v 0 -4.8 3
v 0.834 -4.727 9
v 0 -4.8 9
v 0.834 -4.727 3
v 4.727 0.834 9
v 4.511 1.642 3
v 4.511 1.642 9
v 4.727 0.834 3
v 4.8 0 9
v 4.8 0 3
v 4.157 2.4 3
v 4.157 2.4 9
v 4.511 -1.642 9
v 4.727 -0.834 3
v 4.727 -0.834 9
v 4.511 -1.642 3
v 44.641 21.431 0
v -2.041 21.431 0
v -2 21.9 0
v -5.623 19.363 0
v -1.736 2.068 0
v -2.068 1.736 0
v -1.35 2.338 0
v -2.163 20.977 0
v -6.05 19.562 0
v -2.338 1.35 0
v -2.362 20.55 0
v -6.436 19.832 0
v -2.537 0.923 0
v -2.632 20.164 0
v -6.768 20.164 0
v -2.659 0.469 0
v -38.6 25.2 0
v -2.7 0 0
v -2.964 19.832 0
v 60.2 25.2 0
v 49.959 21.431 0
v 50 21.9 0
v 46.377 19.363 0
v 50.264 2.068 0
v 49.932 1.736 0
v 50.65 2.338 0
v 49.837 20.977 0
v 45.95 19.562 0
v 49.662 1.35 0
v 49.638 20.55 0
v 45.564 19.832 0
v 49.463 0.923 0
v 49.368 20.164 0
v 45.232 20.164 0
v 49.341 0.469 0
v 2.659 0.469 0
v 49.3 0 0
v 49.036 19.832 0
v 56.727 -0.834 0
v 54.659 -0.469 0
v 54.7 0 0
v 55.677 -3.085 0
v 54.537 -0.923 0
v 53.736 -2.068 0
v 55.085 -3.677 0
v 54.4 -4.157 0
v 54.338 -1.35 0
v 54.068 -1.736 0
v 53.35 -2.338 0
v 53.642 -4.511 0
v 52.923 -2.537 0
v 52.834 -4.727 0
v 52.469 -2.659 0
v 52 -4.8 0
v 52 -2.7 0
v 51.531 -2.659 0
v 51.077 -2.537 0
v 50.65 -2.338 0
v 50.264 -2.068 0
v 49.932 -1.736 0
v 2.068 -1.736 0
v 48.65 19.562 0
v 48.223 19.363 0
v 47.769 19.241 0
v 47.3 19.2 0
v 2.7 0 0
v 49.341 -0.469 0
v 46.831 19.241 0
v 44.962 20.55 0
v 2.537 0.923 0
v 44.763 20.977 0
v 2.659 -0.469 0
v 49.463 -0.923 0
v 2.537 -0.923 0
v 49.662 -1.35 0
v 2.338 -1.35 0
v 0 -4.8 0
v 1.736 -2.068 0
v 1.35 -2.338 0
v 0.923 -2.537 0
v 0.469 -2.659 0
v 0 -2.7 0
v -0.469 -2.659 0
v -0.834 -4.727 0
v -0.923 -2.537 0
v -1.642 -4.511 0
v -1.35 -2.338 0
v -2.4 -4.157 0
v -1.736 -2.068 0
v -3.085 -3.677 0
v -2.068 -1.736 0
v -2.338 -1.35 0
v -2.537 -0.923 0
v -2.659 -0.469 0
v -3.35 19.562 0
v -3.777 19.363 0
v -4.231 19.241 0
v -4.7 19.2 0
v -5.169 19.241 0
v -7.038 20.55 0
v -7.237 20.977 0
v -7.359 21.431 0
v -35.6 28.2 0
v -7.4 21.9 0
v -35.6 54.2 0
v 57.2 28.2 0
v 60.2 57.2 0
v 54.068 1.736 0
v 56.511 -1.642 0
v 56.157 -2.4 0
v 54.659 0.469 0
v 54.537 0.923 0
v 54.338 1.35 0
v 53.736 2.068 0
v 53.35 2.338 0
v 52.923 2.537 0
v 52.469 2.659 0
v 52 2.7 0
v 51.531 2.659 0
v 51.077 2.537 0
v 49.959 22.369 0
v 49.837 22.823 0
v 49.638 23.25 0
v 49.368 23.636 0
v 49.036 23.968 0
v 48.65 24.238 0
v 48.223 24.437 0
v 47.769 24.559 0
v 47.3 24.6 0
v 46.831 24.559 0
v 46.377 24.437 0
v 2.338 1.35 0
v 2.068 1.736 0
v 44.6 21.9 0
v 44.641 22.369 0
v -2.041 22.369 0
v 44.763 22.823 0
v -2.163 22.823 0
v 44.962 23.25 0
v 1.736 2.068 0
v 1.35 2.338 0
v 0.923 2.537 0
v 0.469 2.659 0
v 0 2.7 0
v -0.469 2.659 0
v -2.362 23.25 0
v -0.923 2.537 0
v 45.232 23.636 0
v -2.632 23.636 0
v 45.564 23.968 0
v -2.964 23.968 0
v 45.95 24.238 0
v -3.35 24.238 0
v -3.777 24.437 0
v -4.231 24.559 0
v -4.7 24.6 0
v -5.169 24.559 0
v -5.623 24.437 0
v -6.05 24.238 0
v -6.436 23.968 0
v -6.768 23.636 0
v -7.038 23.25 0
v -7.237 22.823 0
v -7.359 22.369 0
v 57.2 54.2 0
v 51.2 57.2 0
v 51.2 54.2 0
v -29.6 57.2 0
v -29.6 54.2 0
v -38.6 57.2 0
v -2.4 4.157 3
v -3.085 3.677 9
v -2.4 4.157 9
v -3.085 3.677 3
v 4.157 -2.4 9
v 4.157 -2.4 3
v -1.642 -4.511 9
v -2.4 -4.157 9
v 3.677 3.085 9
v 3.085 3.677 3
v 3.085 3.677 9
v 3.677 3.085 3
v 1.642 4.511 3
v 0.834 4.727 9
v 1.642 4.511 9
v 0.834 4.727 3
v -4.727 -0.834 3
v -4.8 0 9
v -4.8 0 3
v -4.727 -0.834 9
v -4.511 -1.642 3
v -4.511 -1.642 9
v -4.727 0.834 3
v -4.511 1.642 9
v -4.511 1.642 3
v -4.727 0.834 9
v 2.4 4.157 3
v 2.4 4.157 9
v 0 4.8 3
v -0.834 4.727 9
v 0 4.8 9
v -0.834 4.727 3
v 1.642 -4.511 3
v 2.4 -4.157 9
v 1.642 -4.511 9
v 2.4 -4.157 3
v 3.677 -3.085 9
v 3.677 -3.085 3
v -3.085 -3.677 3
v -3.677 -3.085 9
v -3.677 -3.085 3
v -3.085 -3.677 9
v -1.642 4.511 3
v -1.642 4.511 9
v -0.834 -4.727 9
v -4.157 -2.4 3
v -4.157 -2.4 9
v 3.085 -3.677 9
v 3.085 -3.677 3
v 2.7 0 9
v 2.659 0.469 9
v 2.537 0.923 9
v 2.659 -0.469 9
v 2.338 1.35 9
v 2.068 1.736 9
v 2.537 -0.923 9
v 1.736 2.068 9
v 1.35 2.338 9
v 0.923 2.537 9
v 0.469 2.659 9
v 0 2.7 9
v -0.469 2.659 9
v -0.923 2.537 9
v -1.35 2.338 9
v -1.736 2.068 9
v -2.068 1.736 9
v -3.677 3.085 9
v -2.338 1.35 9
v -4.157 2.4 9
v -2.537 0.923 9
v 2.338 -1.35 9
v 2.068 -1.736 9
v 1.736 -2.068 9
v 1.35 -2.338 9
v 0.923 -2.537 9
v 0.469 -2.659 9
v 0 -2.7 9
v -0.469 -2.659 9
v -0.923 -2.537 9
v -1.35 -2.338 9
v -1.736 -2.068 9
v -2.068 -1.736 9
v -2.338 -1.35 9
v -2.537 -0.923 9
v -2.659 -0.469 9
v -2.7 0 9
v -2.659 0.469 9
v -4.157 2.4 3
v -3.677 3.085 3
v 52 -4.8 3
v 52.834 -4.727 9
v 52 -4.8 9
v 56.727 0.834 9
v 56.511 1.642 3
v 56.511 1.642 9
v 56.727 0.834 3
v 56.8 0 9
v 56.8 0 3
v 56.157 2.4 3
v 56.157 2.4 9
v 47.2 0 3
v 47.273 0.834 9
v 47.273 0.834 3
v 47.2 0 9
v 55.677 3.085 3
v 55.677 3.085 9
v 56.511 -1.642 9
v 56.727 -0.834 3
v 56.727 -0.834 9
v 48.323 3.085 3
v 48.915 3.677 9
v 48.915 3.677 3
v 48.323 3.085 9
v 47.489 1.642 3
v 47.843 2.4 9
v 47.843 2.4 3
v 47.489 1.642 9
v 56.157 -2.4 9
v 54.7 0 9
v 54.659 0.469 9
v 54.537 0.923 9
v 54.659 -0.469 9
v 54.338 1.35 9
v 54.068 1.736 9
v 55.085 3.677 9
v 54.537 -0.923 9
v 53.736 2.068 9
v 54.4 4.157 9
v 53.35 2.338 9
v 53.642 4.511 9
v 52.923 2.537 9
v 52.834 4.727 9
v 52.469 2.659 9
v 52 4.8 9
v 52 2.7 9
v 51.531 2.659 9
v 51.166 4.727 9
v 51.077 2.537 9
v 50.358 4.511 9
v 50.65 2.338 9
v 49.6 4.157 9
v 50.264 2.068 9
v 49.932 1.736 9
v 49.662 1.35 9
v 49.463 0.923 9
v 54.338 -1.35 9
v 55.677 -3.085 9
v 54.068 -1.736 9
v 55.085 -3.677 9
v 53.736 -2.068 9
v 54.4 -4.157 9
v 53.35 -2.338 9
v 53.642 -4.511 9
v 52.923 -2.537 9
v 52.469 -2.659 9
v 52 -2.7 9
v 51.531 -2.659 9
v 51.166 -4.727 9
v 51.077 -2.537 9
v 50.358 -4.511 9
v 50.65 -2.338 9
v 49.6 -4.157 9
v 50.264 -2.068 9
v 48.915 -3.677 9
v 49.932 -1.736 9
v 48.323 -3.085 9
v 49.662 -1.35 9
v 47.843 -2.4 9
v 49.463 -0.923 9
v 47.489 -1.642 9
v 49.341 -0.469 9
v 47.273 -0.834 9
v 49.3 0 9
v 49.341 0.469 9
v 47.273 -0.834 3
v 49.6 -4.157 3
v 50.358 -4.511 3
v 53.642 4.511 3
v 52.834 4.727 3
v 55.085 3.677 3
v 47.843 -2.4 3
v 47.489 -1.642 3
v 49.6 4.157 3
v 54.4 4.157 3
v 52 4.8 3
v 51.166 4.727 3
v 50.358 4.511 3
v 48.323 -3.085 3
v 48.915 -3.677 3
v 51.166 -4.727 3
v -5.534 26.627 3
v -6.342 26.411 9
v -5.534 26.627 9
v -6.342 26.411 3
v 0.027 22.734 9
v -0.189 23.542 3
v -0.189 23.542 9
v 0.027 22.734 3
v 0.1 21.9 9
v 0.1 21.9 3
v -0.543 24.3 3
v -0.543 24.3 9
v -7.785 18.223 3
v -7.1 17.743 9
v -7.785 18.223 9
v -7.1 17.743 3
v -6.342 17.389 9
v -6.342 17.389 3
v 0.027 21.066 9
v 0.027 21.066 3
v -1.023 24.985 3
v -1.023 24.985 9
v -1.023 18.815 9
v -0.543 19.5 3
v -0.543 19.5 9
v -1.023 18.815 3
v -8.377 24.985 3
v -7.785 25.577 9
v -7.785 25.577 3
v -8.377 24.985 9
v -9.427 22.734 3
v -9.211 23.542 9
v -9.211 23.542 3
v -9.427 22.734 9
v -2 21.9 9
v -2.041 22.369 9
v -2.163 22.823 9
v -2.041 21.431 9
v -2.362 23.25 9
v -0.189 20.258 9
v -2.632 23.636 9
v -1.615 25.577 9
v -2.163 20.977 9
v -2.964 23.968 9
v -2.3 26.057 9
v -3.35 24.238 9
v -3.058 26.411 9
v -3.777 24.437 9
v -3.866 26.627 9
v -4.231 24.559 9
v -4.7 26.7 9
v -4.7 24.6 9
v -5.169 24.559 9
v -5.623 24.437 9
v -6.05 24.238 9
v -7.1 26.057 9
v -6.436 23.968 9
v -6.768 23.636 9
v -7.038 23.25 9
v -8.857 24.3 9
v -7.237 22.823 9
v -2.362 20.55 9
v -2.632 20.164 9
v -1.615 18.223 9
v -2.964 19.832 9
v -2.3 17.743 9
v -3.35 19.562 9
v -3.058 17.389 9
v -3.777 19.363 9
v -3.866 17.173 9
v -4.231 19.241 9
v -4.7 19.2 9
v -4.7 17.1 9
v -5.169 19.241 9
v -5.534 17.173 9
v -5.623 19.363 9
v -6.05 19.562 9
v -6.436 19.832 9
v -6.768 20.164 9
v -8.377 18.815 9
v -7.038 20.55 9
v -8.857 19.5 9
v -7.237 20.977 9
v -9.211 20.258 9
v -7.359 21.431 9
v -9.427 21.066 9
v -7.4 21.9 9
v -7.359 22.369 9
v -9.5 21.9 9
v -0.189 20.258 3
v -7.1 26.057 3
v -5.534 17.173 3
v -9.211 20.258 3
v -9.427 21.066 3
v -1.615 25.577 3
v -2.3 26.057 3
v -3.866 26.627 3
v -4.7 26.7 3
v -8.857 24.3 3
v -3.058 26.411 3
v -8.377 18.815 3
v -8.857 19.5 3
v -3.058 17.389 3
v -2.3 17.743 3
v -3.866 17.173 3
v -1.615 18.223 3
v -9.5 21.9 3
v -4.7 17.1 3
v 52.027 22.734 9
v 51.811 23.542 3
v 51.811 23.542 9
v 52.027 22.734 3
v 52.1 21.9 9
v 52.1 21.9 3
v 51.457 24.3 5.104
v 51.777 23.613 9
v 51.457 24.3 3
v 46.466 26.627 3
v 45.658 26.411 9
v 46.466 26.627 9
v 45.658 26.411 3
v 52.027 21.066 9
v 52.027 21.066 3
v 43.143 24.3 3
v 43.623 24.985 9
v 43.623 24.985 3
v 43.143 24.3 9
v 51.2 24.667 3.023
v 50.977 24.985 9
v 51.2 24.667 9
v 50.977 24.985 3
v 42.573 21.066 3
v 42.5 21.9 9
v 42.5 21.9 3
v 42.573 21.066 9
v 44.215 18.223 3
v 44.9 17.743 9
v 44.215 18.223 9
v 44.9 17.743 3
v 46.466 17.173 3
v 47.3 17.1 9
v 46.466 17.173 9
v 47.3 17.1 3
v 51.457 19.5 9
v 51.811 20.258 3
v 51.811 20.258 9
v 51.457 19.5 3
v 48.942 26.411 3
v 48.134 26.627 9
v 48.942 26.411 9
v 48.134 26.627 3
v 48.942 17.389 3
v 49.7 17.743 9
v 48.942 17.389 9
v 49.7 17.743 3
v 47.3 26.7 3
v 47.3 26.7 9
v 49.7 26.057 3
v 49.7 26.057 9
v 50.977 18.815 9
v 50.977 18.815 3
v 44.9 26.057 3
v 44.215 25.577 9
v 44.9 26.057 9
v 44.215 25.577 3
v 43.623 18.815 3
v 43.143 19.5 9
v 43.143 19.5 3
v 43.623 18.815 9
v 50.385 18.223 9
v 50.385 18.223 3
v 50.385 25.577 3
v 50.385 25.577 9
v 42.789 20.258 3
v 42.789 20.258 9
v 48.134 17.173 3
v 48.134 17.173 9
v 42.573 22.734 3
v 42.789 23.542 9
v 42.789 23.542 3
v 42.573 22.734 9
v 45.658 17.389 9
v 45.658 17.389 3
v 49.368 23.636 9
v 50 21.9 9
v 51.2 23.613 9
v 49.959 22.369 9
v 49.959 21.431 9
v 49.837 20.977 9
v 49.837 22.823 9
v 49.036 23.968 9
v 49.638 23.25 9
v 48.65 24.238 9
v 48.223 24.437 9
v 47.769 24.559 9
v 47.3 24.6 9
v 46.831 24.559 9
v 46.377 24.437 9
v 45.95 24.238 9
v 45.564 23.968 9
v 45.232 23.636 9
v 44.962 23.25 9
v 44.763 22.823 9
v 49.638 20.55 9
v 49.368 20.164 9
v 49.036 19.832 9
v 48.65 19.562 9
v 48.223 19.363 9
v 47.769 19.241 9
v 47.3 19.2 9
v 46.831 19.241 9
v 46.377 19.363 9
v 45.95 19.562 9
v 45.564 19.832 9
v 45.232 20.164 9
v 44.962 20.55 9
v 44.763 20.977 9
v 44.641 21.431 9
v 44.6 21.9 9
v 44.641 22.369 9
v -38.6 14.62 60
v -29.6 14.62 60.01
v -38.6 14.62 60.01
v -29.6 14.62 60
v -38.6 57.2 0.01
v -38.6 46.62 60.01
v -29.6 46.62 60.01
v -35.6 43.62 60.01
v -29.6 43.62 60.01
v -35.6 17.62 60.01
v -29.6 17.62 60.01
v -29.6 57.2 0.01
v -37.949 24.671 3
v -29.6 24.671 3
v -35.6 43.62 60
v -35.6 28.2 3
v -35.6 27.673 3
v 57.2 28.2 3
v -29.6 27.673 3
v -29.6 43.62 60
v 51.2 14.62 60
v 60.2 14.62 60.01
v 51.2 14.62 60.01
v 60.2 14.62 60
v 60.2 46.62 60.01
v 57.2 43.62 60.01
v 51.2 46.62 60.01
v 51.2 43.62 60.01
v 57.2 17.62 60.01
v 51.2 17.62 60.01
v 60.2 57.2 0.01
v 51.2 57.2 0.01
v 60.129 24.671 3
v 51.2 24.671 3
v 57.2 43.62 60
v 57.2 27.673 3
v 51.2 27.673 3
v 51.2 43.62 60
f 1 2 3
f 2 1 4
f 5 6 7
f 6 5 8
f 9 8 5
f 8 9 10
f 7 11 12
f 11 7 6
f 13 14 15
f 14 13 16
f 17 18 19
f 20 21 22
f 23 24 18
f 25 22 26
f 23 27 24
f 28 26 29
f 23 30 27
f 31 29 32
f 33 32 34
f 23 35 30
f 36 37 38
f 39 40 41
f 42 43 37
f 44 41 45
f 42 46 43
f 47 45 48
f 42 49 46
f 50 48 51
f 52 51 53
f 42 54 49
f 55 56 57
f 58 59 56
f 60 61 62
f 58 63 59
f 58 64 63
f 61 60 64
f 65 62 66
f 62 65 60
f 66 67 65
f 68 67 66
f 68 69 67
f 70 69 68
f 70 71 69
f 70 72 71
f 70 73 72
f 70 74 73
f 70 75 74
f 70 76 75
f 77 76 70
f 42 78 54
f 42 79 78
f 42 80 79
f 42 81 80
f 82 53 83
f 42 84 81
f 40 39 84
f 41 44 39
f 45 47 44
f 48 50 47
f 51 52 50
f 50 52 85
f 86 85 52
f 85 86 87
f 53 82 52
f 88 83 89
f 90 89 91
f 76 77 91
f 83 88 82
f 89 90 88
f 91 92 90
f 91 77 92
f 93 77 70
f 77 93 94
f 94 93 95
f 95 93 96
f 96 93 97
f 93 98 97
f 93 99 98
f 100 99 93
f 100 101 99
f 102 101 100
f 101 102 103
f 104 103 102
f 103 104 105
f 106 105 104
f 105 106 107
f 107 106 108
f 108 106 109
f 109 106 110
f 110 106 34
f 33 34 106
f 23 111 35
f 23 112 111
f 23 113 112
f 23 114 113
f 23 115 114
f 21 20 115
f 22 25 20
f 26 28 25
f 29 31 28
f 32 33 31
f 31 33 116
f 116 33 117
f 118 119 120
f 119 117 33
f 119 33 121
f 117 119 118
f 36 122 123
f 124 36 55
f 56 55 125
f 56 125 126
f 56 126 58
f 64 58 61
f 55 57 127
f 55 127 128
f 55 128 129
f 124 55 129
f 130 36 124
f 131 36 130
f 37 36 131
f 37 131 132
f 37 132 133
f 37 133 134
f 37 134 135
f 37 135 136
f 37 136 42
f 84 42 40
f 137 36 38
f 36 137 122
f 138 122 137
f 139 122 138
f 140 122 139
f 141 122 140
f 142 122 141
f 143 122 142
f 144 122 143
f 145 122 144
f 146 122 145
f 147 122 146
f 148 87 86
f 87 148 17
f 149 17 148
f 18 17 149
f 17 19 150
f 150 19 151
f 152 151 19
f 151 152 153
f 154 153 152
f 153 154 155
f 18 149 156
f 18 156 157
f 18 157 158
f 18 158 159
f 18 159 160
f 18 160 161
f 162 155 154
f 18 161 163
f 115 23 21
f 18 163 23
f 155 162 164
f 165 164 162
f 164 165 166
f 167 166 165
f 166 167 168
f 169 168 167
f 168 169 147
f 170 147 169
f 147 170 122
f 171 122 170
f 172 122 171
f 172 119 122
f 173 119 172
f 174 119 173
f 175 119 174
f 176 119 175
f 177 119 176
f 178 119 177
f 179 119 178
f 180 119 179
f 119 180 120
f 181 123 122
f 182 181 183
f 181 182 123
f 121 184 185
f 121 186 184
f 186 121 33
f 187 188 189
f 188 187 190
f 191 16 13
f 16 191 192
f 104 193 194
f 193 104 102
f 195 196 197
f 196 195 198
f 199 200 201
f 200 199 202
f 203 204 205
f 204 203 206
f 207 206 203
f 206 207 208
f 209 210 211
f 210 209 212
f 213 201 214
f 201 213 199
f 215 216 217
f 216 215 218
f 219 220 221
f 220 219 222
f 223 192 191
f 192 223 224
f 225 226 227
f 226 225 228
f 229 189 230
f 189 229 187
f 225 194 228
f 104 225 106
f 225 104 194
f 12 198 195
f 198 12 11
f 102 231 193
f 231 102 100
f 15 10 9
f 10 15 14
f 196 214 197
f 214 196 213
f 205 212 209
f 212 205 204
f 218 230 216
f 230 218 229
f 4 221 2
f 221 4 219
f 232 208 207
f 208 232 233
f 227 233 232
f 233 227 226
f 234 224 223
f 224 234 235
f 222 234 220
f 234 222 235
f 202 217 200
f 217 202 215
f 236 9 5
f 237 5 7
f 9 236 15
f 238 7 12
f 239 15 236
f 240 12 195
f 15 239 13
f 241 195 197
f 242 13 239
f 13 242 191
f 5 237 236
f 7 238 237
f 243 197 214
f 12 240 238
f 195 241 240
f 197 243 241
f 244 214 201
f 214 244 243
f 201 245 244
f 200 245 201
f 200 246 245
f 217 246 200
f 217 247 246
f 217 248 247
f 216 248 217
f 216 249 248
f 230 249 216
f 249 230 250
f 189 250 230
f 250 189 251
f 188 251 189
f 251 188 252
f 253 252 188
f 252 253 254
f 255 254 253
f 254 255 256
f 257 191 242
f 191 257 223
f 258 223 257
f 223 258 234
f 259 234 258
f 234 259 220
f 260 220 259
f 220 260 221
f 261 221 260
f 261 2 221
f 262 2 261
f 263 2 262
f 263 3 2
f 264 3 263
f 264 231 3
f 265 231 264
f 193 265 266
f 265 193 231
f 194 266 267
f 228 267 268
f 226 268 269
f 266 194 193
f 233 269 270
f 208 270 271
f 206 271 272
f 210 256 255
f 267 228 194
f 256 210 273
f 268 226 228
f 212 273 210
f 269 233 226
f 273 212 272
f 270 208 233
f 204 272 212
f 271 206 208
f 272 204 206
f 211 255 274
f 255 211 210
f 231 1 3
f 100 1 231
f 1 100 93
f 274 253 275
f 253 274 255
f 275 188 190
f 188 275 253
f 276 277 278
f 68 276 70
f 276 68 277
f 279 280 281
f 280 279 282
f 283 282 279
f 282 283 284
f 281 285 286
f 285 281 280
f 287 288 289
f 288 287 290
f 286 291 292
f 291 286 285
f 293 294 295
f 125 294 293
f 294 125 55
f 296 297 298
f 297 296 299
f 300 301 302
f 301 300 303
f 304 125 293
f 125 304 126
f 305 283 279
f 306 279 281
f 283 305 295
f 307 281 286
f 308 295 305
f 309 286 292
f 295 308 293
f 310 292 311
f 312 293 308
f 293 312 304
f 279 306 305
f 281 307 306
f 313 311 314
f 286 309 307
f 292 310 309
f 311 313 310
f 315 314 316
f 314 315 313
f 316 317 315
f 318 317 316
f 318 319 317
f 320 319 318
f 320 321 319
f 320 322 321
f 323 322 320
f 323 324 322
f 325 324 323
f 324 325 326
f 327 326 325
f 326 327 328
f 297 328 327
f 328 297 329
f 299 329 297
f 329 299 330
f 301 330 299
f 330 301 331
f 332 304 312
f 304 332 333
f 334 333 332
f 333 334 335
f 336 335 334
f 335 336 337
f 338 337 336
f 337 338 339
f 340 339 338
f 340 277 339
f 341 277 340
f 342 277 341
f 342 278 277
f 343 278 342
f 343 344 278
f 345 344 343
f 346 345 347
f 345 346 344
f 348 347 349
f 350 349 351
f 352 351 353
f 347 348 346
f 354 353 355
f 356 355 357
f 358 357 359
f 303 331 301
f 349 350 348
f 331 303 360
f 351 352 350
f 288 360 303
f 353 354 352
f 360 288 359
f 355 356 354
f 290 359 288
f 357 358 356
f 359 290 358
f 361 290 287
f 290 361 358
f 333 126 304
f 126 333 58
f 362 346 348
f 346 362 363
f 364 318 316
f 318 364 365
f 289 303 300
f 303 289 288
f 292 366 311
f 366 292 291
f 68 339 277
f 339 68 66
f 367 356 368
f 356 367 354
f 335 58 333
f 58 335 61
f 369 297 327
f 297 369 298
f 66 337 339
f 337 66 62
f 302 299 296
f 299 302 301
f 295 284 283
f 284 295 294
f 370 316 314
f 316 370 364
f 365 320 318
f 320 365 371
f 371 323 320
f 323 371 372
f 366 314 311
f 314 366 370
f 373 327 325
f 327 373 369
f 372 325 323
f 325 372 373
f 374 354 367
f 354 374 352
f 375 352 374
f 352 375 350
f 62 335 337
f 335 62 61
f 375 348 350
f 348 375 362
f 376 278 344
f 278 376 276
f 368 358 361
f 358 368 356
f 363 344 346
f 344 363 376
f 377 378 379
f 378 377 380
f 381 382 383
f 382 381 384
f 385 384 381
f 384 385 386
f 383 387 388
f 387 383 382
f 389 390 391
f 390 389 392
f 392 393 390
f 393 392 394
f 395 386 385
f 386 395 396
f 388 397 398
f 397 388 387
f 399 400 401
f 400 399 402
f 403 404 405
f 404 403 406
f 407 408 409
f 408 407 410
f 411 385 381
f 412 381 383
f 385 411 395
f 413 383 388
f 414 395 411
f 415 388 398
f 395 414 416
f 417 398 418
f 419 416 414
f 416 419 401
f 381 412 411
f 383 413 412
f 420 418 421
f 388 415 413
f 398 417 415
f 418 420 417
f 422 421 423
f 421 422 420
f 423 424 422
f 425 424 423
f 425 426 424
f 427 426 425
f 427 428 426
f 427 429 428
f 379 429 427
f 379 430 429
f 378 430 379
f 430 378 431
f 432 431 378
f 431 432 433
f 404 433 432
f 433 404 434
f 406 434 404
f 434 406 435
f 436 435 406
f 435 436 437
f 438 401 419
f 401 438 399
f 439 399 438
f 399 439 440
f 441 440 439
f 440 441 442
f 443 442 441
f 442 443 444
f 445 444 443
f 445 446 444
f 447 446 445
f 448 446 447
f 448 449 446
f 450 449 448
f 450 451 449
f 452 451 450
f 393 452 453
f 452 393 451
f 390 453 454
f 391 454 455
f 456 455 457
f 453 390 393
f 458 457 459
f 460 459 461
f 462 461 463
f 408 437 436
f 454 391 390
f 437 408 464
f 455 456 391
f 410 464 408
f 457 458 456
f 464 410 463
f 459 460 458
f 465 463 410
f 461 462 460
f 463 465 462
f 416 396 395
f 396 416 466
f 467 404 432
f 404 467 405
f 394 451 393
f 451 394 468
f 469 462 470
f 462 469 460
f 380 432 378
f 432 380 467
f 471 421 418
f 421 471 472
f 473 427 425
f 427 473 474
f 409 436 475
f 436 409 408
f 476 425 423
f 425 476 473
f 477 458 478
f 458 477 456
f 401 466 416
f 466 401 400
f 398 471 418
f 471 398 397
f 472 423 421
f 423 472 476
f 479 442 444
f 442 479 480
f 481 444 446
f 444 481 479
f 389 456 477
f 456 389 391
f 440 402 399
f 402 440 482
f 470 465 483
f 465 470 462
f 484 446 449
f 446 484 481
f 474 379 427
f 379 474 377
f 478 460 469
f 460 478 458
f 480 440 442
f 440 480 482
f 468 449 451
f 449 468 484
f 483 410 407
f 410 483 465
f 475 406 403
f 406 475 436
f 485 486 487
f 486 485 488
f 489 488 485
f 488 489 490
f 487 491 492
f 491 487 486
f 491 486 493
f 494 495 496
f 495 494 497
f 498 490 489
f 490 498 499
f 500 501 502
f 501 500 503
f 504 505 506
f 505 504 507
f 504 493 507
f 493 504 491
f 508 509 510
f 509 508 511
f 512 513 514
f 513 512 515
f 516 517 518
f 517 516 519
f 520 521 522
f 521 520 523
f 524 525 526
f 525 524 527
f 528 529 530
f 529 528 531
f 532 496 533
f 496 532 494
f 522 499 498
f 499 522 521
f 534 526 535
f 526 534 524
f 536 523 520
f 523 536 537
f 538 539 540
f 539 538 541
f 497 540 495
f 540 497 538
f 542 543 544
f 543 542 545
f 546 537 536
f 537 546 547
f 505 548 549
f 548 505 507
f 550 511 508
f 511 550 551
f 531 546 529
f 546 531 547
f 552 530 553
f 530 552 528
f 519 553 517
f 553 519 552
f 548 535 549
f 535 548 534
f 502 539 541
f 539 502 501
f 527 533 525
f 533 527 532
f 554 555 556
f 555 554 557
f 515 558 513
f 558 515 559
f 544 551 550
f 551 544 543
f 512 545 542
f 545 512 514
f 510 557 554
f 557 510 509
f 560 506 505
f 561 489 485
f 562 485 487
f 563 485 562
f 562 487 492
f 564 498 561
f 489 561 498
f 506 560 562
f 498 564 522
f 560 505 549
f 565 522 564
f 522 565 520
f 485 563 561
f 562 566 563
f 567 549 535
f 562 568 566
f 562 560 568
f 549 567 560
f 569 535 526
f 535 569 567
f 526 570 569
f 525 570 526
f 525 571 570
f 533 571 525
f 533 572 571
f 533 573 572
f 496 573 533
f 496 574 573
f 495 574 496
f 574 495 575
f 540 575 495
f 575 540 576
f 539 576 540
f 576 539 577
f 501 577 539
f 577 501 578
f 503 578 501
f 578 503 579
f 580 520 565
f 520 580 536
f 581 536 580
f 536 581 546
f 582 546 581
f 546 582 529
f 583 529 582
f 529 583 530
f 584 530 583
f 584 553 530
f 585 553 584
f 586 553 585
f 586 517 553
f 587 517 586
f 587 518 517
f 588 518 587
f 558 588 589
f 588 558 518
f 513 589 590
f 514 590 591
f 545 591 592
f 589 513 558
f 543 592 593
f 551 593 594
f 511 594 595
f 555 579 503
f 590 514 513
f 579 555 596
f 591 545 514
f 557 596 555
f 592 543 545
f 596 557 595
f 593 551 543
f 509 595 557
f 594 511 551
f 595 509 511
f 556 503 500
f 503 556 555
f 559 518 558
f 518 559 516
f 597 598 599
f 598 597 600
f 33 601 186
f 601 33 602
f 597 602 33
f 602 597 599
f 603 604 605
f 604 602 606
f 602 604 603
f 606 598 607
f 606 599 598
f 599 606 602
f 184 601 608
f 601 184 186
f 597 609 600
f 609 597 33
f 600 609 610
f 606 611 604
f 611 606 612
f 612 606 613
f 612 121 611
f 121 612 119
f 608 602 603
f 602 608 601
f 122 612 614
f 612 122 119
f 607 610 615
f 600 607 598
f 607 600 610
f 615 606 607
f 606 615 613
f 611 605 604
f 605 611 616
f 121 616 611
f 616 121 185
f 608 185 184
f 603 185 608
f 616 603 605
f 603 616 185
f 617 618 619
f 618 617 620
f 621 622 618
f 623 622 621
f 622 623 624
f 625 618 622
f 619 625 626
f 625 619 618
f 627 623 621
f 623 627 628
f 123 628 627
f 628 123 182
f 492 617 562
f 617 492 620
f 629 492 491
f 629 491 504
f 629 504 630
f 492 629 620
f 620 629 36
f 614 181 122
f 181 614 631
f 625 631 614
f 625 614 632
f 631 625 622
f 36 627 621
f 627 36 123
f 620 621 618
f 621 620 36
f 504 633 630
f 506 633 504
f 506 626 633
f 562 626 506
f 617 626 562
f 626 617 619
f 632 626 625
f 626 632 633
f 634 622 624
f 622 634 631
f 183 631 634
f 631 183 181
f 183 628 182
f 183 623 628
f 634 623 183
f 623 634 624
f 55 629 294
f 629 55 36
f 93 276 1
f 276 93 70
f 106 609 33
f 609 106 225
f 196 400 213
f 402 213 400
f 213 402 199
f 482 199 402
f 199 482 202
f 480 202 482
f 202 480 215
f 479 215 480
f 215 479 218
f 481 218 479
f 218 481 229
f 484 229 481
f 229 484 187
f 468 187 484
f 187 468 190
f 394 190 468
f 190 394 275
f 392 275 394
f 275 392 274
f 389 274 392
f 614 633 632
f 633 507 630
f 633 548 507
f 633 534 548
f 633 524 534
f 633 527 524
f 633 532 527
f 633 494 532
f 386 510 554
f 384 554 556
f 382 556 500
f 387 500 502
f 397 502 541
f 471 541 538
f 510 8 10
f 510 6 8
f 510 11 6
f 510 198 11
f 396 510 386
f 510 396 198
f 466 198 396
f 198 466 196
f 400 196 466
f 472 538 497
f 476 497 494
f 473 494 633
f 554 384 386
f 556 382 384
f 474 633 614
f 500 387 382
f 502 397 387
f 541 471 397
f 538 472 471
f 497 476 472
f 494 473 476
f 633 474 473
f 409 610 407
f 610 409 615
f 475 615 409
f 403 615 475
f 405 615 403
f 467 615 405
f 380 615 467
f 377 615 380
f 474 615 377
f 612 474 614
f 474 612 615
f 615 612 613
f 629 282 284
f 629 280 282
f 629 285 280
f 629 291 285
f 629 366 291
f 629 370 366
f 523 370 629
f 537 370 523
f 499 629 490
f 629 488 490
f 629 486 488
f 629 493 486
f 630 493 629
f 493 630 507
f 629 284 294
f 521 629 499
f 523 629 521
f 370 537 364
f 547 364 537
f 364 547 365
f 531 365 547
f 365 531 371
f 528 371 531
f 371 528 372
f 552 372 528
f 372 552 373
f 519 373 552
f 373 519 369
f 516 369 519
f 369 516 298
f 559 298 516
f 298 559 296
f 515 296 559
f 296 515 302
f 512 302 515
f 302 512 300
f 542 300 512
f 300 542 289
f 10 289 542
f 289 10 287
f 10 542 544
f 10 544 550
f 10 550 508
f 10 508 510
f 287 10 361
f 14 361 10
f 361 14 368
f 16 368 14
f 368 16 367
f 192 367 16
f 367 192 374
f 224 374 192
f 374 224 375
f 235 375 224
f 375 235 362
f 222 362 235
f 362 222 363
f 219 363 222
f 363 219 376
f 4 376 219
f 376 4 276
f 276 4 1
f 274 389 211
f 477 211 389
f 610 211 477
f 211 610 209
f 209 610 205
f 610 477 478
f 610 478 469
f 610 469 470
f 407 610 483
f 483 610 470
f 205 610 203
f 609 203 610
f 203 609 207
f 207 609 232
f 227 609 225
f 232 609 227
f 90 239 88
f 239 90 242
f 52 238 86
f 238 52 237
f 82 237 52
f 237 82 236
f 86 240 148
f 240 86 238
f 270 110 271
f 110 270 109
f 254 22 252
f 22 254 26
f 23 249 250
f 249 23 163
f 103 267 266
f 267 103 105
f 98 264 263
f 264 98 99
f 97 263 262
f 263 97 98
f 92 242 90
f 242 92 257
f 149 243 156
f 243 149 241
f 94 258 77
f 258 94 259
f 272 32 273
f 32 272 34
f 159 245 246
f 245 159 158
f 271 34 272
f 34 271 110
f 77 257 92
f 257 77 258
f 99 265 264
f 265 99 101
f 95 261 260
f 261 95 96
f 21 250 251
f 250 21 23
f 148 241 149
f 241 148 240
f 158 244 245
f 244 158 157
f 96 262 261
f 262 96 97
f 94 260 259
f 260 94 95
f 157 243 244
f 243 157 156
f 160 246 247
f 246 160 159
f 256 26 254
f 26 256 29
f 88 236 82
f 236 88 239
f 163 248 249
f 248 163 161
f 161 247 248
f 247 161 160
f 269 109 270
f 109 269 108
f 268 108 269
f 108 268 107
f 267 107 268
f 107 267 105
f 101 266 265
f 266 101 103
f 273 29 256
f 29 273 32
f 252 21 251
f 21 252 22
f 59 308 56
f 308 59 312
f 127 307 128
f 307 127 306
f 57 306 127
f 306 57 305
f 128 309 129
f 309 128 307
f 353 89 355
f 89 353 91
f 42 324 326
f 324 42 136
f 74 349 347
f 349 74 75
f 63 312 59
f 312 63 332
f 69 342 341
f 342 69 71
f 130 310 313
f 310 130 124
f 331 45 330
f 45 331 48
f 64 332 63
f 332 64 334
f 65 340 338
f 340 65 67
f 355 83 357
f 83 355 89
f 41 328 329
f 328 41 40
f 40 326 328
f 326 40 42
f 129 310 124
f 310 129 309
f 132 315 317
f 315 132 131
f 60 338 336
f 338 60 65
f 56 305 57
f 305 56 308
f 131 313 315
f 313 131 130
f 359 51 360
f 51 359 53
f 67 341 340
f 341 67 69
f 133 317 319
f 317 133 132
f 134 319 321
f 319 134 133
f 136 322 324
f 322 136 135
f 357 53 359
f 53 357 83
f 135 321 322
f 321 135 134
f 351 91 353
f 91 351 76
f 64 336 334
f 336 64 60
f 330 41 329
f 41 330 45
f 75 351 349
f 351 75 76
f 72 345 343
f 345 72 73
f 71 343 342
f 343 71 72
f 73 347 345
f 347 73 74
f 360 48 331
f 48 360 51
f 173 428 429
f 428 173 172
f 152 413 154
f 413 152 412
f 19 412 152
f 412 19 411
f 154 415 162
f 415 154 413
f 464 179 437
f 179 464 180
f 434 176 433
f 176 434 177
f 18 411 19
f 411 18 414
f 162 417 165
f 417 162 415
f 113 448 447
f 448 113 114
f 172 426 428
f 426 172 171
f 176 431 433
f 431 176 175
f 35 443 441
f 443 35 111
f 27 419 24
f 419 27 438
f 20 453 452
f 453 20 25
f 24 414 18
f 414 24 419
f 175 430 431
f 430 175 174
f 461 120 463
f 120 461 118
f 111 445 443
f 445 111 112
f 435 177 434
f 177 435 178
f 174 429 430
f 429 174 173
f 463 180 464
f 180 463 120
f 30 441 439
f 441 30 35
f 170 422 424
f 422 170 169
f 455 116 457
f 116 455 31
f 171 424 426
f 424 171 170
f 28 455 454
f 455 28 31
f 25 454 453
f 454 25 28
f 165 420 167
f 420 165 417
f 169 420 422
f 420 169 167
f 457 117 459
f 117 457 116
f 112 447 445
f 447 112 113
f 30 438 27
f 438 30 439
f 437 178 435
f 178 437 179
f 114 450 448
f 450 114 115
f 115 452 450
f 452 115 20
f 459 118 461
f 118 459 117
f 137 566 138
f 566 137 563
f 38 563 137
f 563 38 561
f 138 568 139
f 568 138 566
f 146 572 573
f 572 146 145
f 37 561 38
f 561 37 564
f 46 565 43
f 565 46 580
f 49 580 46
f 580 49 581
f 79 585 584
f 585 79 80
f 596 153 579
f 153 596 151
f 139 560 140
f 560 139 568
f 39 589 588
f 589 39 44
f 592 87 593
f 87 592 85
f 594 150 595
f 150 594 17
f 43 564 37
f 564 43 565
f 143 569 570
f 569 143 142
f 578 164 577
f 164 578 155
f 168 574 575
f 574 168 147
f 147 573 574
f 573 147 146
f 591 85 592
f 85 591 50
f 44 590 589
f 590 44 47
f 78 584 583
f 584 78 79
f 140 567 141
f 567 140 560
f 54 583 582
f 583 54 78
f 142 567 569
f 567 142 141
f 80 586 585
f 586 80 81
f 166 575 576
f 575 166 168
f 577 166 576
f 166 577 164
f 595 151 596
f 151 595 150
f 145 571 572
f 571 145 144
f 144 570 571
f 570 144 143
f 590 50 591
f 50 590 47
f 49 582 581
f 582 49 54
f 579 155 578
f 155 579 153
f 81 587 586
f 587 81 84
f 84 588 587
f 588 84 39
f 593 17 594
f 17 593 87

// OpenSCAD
// ============================================================
// 92mm Fan Holder — tilted, with left/right alignment choice
// Fan is vertical but tilted tilt_deg degrees toward the front (−Y).
// U-bracket arms are parallelogram prisms that follow the tilt.
// All faces at Z=0 are flat → printable without supports.
// Fan slides in along the tilt axis from the top.
// ============================================================

/* [Fan] */
fan_size    = 92;     // Fan outer side length (mm) — square
fan_thick   = 25;     // Fan body depth in Y (mm)
fan_clear_x = 0.4;   // Gap between outer wall and fan face in X (mm)
fan_clear_y = 0.5;   // Gap between arm and fan in Y (mm)
fan_behind  = 2;    // Gap from pin-area rear edge to front arm at Z=0 (mm)
tilt_deg    = 10;    // Tilt angle toward front — degrees from vertical
fan_align   = "right"; // "left" = fan centred on left pin pair, "right" = right pin pair

/* [Pin Mounting] */
pin_hole_r  = 2.3;  // Pin radius (mm)
pin_clear   = 0.4;  // Extra radius clearance for printing tolerance (mm)
pin_wall    = 2.5;  // Socket wall thickness (mm)
pin_sock_h  = 6;    // Socket height above base plate (mm)
base_t      = 3;    // Base bridge plate thickness (mm)

pin_dx      = 52; // X distance between pins in same row (mm)
pin_dy      = 21.9; // Y distance between rows (mm)
pin_shift_x = -4.7;  // X offset of back row vs front row (mm)

/* [U-Brackets] */
arm_t       = 3;    // Arm and outer-wall thickness (mm)
arm_d       = 6;    // Arm depth extending inward over fan edge (mm)
bracket_h   = 60;   // Total Z height of U-brackets (mm)

$fn = 36;
eps = 0.01;  // thin face for hull slabs

// ============================================================
// Derived — do not edit
// ============================================================

pin_pos = [
    [0,                    0     ],
    [pin_dx,               0     ],
    [pin_shift_x,          pin_dy],
    [pin_shift_x + pin_dx, pin_dy]
];

// Outermost pin X — leftmost is front-left (x=0), rightmost is back-right (shifted)
left_most_x  = min(pin_pos[0][0], pin_pos[2][0]);   // = 0
right_most_x = max(pin_pos[1][0], pin_pos[3][0]);   // = pin_shift_x + pin_dx
y_hi         = pin_pos[2][1] + pin_hole_r + pin_wall;

// Fan outer edge flush with outer socket wall
fan_x0 = (fan_align == "left")
         ? left_most_x  - (pin_hole_r + pin_wall)
         : right_most_x + (pin_hole_r + pin_wall) - fan_size;
fan_y0 = y_hi + fan_behind;     // front face of fan at Z=0

// Slide-path geometry — driven by bracket_h directly
H_dz = bracket_h;               // Z height of bracket
H    = bracket_h / cos(tilt_deg); // total slide length along fan axis
H_dy = bracket_h * tan(tilt_deg); // Y shift from Z=0 to Z=H_dz (toward front)

// Arm Y positions at Z=0
arm_yf0 = fan_y0 - fan_clear_y - arm_t;      // front arm base face
arm_yb0 = fan_y0 + fan_thick + fan_clear_y;   // back arm base face
arm_span = arm_yb0 - arm_yf0 + arm_t;         // outer-wall Y span

// ============================================================
// U-bracket modules
// Each bracket: outer-wall + front arm + back arm.
// All three pieces are parallelogram prisms (hull of two flat slabs),
// so the bottom face is always flat at Z=0.
// ============================================================

module left_bracket() {
    lx = fan_x0 - fan_clear_x;   // slot inner face X (= outer-wall inner face)
    union() {
        // Outer wall — parallelogram prism leaning with the fan tilt
        hull() {
            translate([lx - arm_t, arm_yf0,        0   ]) cube([arm_t, arm_span, eps]);
            translate([lx - arm_t, arm_yf0 - H_dy, H_dz]) cube([arm_t, arm_span, eps]);
        }
        // Front arm — captures the front face of the fan
        hull() {
            translate([lx, arm_yf0,        0   ]) cube([arm_d, arm_t, eps]);
            translate([lx, arm_yf0 - H_dy, H_dz]) cube([arm_d, arm_t, eps]);
        }
        // Back arm — captures the back face of the fan
        hull() {
            translate([lx, arm_yb0,        0   ]) cube([arm_d, arm_t, eps]);
            translate([lx, arm_yb0 - H_dy, H_dz]) cube([arm_d, arm_t, eps]);
        }
    }
}

module right_bracket() {
    rx = fan_x0 + fan_size + fan_clear_x;  // slot inner face X (right side)
    union() {
        // Outer wall
        hull() {
            translate([rx, arm_yf0,        0   ]) cube([arm_t, arm_span, eps]);
            translate([rx, arm_yf0 - H_dy, H_dz]) cube([arm_t, arm_span, eps]);
        }
        // Front arm
        hull() {
            translate([rx - arm_d, arm_yf0,        0   ]) cube([arm_d, arm_t, eps]);
            translate([rx - arm_d, arm_yf0 - H_dy, H_dz]) cube([arm_d, arm_t, eps]);
        }
        // Back arm
        hull() {
            translate([rx - arm_d, arm_yb0,        0   ]) cube([arm_d, arm_t, eps]);
            translate([rx - arm_d, arm_yb0 - H_dy, H_dz]) cube([arm_d, arm_t, eps]);
        }
    }
}

// ============================================================
// Assembly
// ============================================================

difference() {
    union() {

        // Single solid base — hull of all 4 pin cylinders + full-width front bar
        hull() {
            for (p = pin_pos)
                translate([p[0], p[1], 0])
                    cylinder(r = pin_hole_r + pin_wall, h = base_t);
            translate([fan_x0 - fan_clear_x - arm_t, arm_yf0, 0])
                cube([fan_size + 2*(fan_clear_x + arm_t), arm_t, base_t]);
        }

        // Pin sockets
        for (p = pin_pos)
            translate([p[0], p[1], 0])
                cylinder(r = pin_hole_r + pin_wall, h = base_t + pin_sock_h);

        // U-brackets
        left_bracket();
        right_bracket();
    }

    // Pin holes — extend 2 mm past each face for clean subtraction
    for (p = pin_pos)
        translate([p[0], p[1], -2])
            cylinder(r = pin_hole_r + pin_clear, h = base_t + pin_sock_h + 4);
}
